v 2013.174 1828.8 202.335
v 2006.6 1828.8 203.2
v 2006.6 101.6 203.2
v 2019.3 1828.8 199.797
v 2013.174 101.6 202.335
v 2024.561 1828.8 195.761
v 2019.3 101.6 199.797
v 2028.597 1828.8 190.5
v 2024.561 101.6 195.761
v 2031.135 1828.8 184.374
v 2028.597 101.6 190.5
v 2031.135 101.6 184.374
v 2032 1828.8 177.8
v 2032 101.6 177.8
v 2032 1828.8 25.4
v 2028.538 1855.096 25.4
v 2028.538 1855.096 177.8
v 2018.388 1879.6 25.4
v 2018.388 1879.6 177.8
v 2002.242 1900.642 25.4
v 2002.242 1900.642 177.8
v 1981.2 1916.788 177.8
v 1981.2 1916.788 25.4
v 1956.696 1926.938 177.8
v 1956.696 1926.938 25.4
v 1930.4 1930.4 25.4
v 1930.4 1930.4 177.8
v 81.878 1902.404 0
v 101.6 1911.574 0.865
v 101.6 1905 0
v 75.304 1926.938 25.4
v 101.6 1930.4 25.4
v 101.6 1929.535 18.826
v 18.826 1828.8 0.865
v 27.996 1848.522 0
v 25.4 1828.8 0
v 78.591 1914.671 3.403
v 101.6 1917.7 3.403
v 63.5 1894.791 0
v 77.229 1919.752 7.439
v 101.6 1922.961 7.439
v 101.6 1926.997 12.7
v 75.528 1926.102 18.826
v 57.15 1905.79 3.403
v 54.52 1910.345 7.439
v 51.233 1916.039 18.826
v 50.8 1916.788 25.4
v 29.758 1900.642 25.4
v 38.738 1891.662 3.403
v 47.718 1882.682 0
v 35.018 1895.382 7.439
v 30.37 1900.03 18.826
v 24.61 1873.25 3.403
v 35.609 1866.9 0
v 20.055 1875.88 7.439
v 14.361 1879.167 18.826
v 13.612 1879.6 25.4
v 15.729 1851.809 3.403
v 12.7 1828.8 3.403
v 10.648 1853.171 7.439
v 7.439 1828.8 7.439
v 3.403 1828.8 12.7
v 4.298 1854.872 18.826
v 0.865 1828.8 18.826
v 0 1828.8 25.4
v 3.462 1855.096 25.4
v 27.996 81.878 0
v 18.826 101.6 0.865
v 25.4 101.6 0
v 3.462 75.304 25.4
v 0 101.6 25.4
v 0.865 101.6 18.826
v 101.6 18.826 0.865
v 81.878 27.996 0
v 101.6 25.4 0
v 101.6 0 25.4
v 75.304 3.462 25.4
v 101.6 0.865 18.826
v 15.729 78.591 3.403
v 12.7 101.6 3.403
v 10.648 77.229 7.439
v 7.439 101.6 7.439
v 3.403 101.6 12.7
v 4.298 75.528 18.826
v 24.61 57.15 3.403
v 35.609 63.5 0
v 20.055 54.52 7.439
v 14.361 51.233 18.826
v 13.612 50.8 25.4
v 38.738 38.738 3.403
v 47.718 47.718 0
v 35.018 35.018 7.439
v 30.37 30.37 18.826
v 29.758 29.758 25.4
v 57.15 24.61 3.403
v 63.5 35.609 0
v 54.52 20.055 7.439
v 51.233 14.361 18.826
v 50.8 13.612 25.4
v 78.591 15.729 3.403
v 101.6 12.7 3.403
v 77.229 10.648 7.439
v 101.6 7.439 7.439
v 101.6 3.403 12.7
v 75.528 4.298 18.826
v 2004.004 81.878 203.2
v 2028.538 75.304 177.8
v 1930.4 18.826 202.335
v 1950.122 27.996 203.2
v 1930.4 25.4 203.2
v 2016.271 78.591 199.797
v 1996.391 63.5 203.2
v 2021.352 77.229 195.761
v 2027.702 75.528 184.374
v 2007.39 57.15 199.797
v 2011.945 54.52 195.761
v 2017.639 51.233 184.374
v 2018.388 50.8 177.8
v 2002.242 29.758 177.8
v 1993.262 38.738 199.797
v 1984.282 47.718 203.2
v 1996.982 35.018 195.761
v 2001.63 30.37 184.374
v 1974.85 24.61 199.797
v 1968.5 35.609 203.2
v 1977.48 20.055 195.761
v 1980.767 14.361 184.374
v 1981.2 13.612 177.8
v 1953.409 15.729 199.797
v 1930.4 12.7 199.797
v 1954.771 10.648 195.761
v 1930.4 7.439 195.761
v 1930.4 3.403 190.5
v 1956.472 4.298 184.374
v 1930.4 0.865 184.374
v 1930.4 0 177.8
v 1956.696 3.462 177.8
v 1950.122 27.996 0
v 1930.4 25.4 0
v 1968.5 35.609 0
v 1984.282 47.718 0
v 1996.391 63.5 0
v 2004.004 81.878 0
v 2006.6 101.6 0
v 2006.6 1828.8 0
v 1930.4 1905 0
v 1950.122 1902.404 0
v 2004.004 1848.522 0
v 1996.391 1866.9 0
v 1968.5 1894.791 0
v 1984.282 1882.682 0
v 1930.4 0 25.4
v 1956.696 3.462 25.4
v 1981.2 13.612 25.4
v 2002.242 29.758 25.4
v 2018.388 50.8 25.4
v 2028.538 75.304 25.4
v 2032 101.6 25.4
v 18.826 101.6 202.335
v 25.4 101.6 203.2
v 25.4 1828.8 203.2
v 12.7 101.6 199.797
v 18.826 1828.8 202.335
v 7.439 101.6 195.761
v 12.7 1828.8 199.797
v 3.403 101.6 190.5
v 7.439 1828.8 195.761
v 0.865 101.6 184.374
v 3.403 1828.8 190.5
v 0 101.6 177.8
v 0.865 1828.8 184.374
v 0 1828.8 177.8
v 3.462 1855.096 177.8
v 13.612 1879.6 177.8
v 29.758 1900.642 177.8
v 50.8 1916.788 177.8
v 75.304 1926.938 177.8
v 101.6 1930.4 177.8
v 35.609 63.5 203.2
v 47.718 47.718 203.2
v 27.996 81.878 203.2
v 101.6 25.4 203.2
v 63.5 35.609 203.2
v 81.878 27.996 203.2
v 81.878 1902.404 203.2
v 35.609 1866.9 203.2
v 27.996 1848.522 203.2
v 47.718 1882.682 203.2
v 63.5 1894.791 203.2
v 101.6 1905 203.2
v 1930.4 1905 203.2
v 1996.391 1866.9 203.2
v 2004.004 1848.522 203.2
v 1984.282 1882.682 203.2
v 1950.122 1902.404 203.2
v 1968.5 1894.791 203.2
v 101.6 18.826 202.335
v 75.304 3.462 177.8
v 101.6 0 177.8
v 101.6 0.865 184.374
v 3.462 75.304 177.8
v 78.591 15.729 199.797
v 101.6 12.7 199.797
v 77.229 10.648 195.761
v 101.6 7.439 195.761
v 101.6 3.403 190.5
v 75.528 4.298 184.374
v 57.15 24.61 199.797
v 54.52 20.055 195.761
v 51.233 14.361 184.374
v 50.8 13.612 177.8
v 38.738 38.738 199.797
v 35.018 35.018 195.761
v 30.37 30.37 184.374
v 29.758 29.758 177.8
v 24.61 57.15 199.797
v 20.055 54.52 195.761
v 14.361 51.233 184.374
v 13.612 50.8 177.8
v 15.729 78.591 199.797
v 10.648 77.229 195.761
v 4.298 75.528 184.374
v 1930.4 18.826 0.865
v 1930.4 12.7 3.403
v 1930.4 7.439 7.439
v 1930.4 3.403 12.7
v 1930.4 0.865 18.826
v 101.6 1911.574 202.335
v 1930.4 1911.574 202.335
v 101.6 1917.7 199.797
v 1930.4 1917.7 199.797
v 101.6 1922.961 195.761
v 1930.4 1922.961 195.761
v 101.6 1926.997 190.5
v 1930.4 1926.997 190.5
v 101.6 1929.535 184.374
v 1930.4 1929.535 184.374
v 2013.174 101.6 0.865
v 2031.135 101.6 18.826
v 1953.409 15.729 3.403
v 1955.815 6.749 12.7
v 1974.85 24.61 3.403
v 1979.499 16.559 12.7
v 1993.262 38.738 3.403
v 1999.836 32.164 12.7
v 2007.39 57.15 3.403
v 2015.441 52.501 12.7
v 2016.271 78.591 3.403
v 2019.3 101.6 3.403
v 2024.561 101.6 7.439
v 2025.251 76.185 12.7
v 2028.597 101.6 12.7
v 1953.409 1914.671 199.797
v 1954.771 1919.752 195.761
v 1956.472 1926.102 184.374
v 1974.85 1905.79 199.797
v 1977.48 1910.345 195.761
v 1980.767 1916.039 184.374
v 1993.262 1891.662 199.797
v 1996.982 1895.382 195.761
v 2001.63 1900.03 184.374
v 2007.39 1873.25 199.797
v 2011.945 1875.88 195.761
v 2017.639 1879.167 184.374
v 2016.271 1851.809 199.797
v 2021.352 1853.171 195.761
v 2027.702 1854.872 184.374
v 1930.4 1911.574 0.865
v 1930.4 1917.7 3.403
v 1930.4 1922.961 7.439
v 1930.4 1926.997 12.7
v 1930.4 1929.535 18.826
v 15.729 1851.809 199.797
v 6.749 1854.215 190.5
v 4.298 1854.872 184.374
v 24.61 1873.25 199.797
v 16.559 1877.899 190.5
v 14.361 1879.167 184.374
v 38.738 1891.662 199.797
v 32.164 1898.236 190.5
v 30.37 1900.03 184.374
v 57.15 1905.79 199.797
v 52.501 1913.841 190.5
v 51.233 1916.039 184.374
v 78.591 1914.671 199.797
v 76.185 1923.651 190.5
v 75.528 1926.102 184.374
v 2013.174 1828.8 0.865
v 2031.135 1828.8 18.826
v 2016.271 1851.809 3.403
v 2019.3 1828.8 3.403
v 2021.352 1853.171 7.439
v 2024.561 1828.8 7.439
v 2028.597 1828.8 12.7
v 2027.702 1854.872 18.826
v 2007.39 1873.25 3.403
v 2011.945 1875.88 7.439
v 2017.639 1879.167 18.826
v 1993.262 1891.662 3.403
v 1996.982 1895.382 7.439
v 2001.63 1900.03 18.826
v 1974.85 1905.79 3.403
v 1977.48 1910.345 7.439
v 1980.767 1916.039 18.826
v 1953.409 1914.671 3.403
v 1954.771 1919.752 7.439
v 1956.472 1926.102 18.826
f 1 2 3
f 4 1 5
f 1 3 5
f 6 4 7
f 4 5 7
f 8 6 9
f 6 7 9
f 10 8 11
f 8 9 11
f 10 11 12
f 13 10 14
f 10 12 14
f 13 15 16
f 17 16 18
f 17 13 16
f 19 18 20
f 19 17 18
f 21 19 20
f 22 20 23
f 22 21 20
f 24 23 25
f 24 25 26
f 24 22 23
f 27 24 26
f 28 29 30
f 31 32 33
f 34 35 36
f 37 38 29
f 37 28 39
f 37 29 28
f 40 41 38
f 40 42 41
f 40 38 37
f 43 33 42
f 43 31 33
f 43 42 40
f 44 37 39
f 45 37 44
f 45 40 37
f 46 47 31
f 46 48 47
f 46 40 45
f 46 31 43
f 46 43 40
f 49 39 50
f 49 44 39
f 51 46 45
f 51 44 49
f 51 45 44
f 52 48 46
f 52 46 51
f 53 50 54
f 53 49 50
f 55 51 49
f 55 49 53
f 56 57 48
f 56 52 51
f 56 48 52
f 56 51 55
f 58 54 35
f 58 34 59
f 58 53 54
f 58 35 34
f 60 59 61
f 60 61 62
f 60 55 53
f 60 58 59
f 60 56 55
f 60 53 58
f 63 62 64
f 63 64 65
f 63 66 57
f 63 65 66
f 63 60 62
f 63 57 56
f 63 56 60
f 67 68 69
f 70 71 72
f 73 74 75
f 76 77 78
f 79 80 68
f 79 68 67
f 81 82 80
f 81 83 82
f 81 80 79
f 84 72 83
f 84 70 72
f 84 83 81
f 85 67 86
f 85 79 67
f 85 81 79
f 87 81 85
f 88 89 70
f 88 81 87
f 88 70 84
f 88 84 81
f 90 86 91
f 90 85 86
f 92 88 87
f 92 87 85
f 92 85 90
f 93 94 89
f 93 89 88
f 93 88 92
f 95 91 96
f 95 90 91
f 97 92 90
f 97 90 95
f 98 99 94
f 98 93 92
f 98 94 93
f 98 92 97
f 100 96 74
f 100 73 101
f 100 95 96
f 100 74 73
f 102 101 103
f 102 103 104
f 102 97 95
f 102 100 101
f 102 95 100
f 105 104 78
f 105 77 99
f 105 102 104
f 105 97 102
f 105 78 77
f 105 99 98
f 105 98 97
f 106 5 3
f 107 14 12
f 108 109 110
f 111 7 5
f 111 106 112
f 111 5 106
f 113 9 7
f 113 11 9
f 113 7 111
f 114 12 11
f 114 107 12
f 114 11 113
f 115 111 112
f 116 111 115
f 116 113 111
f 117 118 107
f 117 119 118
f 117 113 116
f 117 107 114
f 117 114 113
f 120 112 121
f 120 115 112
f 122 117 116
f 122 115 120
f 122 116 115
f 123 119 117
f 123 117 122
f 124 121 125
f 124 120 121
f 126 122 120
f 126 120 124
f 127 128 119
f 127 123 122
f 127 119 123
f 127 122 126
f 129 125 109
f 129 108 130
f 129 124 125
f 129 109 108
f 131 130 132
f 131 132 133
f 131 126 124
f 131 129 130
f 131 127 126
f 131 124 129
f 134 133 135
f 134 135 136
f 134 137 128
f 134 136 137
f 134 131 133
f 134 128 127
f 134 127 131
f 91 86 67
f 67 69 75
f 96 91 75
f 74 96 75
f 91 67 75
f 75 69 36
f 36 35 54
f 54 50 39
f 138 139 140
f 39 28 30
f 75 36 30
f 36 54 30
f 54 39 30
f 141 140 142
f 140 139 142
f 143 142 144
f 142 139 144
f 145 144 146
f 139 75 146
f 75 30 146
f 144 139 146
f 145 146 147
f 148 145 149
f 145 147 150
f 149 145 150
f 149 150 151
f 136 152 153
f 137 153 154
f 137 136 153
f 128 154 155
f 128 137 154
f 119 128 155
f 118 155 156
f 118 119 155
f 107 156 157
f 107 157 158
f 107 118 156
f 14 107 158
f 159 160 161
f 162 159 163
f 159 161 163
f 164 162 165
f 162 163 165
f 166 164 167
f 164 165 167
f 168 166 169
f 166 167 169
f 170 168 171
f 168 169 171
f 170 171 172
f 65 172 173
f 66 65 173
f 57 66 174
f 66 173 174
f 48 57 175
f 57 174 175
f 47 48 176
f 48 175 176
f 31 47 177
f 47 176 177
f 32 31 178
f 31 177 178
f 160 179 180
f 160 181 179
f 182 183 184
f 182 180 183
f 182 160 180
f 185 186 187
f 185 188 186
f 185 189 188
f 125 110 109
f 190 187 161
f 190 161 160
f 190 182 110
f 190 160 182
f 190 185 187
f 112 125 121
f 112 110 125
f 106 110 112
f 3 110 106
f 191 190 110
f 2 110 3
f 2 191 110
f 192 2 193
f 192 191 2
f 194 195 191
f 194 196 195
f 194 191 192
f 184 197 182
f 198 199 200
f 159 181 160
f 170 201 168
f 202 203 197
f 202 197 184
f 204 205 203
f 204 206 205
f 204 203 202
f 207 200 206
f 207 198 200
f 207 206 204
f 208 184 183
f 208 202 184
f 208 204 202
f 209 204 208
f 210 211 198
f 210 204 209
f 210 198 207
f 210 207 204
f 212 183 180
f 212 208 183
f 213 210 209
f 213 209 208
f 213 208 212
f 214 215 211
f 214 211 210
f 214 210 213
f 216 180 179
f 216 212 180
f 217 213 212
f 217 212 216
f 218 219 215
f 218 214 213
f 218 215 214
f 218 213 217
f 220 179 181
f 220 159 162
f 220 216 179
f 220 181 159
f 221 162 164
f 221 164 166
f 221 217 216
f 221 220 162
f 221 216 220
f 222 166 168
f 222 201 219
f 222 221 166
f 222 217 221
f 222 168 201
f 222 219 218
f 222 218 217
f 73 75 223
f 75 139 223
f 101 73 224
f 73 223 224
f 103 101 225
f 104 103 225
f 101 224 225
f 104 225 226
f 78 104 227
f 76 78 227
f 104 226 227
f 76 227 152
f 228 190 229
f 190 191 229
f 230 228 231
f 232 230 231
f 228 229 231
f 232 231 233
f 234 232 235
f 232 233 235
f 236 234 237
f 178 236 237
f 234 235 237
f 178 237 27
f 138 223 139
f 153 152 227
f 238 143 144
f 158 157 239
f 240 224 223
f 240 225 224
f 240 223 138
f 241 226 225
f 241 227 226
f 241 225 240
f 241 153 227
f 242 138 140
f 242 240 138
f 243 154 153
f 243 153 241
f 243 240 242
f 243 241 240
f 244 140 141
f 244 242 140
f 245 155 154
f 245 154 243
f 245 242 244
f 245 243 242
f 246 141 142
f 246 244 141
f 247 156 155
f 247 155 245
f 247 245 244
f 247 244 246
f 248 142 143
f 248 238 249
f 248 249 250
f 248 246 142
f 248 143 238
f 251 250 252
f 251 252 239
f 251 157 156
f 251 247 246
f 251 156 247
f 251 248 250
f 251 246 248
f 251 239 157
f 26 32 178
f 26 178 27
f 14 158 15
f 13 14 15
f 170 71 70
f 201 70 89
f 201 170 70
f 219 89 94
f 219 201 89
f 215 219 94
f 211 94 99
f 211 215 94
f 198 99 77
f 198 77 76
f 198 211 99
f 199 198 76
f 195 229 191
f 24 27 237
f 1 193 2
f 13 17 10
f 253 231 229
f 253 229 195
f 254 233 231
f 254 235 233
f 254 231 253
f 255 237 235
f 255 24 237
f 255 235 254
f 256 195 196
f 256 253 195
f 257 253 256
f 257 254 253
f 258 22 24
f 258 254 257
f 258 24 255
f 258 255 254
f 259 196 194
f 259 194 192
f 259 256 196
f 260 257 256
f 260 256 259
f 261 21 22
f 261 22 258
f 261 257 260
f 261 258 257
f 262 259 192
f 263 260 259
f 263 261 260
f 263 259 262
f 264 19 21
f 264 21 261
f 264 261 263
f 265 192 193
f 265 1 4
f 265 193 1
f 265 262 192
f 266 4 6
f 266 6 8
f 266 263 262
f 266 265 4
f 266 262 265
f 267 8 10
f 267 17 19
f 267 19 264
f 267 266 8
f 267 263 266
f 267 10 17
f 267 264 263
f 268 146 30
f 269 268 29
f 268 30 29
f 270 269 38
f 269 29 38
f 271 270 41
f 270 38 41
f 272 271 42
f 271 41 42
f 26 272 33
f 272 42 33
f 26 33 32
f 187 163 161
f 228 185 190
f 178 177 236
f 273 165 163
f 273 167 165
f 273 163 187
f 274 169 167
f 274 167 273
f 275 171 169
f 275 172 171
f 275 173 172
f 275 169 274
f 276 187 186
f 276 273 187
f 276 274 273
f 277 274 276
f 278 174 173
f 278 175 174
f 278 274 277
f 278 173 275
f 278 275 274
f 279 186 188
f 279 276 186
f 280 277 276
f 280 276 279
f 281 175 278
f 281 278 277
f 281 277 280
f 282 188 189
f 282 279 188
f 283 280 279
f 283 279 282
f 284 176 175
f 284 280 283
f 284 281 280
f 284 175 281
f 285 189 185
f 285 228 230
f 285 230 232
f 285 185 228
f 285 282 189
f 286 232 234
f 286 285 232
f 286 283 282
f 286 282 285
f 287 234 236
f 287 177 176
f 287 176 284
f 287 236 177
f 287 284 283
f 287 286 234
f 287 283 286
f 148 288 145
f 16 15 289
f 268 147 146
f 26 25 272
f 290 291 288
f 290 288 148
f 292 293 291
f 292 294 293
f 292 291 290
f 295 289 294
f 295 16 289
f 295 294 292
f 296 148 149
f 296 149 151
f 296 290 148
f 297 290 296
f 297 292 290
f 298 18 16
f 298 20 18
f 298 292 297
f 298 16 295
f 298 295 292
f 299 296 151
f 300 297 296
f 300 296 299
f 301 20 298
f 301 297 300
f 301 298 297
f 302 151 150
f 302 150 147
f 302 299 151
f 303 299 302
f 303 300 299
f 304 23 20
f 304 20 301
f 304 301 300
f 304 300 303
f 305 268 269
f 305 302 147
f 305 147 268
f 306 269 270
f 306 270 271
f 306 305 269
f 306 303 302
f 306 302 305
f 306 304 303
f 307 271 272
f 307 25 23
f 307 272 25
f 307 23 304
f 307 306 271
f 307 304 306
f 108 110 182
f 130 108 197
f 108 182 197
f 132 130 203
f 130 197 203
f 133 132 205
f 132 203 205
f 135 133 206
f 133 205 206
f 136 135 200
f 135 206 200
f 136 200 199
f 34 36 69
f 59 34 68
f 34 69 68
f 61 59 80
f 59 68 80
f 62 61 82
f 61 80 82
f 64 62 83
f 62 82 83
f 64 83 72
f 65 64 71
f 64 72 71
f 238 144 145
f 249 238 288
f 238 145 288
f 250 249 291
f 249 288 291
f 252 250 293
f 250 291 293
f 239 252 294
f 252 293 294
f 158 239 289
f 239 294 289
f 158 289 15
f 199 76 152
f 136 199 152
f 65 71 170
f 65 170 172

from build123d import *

# Parameters (mm, degrees)
F0_W     = 2032
F0_H     = 1930.4
F1_DEPTH = 203.2
F2_R     = 101.6
F3_R     = 25.4
F4_R     = 25.4


with BuildPart() as f1:
    # F0 (on Top) → F1 (new body)
    with BuildSketch(Plane.XY):
        with Locations((1016, 965.2)):
            Rectangle(F0_W, F0_H)
    extrude(amount=F1_DEPTH)

    # F2
    f2_edges = [f1.edges().sort_by_distance(p)[0] for p in [
        (0, 1930.4, 101.6),
        (0, 0, 101.6),
        (2032, 0, 101.6),
        (2032, 1930.4, 101.6),
    ]]
    fillet(f2_edges, radius=F2_R)

    # F3
    f3_edges = [f1.edges().sort_by_distance(p)[0] for p in [
        (1016, 1930.4, 203.2),
        (29.757951, 1900.642049, 203.2),
        (0, 965.2, 203.2),
        (29.757951, 29.757951, 203.2),
        (1016, 0, 203.2),
        (2002.242049, 29.757951, 203.2),
        (2032, 965.2, 203.2),
        (2002.242049, 1900.642049, 203.2),
    ]]
    fillet(f3_edges, radius=F3_R)

    # F4
    f4_edges = [f1.edges().sort_by_distance(p)[0] for p in [
        (2002.242049, 29.757951, 0),
        (1016, 0, 0),
        (29.757951, 29.757951, 0),
        (0, 965.2, 0),
        (29.757951, 1900.642049, 0),
        (1016, 1930.4, 0),
        (2002.242049, 1900.642049, 0),
        (2032, 965.2, 0),
    ]]
    fillet(f4_edges, radius=F4_R)


solid = f1.part
